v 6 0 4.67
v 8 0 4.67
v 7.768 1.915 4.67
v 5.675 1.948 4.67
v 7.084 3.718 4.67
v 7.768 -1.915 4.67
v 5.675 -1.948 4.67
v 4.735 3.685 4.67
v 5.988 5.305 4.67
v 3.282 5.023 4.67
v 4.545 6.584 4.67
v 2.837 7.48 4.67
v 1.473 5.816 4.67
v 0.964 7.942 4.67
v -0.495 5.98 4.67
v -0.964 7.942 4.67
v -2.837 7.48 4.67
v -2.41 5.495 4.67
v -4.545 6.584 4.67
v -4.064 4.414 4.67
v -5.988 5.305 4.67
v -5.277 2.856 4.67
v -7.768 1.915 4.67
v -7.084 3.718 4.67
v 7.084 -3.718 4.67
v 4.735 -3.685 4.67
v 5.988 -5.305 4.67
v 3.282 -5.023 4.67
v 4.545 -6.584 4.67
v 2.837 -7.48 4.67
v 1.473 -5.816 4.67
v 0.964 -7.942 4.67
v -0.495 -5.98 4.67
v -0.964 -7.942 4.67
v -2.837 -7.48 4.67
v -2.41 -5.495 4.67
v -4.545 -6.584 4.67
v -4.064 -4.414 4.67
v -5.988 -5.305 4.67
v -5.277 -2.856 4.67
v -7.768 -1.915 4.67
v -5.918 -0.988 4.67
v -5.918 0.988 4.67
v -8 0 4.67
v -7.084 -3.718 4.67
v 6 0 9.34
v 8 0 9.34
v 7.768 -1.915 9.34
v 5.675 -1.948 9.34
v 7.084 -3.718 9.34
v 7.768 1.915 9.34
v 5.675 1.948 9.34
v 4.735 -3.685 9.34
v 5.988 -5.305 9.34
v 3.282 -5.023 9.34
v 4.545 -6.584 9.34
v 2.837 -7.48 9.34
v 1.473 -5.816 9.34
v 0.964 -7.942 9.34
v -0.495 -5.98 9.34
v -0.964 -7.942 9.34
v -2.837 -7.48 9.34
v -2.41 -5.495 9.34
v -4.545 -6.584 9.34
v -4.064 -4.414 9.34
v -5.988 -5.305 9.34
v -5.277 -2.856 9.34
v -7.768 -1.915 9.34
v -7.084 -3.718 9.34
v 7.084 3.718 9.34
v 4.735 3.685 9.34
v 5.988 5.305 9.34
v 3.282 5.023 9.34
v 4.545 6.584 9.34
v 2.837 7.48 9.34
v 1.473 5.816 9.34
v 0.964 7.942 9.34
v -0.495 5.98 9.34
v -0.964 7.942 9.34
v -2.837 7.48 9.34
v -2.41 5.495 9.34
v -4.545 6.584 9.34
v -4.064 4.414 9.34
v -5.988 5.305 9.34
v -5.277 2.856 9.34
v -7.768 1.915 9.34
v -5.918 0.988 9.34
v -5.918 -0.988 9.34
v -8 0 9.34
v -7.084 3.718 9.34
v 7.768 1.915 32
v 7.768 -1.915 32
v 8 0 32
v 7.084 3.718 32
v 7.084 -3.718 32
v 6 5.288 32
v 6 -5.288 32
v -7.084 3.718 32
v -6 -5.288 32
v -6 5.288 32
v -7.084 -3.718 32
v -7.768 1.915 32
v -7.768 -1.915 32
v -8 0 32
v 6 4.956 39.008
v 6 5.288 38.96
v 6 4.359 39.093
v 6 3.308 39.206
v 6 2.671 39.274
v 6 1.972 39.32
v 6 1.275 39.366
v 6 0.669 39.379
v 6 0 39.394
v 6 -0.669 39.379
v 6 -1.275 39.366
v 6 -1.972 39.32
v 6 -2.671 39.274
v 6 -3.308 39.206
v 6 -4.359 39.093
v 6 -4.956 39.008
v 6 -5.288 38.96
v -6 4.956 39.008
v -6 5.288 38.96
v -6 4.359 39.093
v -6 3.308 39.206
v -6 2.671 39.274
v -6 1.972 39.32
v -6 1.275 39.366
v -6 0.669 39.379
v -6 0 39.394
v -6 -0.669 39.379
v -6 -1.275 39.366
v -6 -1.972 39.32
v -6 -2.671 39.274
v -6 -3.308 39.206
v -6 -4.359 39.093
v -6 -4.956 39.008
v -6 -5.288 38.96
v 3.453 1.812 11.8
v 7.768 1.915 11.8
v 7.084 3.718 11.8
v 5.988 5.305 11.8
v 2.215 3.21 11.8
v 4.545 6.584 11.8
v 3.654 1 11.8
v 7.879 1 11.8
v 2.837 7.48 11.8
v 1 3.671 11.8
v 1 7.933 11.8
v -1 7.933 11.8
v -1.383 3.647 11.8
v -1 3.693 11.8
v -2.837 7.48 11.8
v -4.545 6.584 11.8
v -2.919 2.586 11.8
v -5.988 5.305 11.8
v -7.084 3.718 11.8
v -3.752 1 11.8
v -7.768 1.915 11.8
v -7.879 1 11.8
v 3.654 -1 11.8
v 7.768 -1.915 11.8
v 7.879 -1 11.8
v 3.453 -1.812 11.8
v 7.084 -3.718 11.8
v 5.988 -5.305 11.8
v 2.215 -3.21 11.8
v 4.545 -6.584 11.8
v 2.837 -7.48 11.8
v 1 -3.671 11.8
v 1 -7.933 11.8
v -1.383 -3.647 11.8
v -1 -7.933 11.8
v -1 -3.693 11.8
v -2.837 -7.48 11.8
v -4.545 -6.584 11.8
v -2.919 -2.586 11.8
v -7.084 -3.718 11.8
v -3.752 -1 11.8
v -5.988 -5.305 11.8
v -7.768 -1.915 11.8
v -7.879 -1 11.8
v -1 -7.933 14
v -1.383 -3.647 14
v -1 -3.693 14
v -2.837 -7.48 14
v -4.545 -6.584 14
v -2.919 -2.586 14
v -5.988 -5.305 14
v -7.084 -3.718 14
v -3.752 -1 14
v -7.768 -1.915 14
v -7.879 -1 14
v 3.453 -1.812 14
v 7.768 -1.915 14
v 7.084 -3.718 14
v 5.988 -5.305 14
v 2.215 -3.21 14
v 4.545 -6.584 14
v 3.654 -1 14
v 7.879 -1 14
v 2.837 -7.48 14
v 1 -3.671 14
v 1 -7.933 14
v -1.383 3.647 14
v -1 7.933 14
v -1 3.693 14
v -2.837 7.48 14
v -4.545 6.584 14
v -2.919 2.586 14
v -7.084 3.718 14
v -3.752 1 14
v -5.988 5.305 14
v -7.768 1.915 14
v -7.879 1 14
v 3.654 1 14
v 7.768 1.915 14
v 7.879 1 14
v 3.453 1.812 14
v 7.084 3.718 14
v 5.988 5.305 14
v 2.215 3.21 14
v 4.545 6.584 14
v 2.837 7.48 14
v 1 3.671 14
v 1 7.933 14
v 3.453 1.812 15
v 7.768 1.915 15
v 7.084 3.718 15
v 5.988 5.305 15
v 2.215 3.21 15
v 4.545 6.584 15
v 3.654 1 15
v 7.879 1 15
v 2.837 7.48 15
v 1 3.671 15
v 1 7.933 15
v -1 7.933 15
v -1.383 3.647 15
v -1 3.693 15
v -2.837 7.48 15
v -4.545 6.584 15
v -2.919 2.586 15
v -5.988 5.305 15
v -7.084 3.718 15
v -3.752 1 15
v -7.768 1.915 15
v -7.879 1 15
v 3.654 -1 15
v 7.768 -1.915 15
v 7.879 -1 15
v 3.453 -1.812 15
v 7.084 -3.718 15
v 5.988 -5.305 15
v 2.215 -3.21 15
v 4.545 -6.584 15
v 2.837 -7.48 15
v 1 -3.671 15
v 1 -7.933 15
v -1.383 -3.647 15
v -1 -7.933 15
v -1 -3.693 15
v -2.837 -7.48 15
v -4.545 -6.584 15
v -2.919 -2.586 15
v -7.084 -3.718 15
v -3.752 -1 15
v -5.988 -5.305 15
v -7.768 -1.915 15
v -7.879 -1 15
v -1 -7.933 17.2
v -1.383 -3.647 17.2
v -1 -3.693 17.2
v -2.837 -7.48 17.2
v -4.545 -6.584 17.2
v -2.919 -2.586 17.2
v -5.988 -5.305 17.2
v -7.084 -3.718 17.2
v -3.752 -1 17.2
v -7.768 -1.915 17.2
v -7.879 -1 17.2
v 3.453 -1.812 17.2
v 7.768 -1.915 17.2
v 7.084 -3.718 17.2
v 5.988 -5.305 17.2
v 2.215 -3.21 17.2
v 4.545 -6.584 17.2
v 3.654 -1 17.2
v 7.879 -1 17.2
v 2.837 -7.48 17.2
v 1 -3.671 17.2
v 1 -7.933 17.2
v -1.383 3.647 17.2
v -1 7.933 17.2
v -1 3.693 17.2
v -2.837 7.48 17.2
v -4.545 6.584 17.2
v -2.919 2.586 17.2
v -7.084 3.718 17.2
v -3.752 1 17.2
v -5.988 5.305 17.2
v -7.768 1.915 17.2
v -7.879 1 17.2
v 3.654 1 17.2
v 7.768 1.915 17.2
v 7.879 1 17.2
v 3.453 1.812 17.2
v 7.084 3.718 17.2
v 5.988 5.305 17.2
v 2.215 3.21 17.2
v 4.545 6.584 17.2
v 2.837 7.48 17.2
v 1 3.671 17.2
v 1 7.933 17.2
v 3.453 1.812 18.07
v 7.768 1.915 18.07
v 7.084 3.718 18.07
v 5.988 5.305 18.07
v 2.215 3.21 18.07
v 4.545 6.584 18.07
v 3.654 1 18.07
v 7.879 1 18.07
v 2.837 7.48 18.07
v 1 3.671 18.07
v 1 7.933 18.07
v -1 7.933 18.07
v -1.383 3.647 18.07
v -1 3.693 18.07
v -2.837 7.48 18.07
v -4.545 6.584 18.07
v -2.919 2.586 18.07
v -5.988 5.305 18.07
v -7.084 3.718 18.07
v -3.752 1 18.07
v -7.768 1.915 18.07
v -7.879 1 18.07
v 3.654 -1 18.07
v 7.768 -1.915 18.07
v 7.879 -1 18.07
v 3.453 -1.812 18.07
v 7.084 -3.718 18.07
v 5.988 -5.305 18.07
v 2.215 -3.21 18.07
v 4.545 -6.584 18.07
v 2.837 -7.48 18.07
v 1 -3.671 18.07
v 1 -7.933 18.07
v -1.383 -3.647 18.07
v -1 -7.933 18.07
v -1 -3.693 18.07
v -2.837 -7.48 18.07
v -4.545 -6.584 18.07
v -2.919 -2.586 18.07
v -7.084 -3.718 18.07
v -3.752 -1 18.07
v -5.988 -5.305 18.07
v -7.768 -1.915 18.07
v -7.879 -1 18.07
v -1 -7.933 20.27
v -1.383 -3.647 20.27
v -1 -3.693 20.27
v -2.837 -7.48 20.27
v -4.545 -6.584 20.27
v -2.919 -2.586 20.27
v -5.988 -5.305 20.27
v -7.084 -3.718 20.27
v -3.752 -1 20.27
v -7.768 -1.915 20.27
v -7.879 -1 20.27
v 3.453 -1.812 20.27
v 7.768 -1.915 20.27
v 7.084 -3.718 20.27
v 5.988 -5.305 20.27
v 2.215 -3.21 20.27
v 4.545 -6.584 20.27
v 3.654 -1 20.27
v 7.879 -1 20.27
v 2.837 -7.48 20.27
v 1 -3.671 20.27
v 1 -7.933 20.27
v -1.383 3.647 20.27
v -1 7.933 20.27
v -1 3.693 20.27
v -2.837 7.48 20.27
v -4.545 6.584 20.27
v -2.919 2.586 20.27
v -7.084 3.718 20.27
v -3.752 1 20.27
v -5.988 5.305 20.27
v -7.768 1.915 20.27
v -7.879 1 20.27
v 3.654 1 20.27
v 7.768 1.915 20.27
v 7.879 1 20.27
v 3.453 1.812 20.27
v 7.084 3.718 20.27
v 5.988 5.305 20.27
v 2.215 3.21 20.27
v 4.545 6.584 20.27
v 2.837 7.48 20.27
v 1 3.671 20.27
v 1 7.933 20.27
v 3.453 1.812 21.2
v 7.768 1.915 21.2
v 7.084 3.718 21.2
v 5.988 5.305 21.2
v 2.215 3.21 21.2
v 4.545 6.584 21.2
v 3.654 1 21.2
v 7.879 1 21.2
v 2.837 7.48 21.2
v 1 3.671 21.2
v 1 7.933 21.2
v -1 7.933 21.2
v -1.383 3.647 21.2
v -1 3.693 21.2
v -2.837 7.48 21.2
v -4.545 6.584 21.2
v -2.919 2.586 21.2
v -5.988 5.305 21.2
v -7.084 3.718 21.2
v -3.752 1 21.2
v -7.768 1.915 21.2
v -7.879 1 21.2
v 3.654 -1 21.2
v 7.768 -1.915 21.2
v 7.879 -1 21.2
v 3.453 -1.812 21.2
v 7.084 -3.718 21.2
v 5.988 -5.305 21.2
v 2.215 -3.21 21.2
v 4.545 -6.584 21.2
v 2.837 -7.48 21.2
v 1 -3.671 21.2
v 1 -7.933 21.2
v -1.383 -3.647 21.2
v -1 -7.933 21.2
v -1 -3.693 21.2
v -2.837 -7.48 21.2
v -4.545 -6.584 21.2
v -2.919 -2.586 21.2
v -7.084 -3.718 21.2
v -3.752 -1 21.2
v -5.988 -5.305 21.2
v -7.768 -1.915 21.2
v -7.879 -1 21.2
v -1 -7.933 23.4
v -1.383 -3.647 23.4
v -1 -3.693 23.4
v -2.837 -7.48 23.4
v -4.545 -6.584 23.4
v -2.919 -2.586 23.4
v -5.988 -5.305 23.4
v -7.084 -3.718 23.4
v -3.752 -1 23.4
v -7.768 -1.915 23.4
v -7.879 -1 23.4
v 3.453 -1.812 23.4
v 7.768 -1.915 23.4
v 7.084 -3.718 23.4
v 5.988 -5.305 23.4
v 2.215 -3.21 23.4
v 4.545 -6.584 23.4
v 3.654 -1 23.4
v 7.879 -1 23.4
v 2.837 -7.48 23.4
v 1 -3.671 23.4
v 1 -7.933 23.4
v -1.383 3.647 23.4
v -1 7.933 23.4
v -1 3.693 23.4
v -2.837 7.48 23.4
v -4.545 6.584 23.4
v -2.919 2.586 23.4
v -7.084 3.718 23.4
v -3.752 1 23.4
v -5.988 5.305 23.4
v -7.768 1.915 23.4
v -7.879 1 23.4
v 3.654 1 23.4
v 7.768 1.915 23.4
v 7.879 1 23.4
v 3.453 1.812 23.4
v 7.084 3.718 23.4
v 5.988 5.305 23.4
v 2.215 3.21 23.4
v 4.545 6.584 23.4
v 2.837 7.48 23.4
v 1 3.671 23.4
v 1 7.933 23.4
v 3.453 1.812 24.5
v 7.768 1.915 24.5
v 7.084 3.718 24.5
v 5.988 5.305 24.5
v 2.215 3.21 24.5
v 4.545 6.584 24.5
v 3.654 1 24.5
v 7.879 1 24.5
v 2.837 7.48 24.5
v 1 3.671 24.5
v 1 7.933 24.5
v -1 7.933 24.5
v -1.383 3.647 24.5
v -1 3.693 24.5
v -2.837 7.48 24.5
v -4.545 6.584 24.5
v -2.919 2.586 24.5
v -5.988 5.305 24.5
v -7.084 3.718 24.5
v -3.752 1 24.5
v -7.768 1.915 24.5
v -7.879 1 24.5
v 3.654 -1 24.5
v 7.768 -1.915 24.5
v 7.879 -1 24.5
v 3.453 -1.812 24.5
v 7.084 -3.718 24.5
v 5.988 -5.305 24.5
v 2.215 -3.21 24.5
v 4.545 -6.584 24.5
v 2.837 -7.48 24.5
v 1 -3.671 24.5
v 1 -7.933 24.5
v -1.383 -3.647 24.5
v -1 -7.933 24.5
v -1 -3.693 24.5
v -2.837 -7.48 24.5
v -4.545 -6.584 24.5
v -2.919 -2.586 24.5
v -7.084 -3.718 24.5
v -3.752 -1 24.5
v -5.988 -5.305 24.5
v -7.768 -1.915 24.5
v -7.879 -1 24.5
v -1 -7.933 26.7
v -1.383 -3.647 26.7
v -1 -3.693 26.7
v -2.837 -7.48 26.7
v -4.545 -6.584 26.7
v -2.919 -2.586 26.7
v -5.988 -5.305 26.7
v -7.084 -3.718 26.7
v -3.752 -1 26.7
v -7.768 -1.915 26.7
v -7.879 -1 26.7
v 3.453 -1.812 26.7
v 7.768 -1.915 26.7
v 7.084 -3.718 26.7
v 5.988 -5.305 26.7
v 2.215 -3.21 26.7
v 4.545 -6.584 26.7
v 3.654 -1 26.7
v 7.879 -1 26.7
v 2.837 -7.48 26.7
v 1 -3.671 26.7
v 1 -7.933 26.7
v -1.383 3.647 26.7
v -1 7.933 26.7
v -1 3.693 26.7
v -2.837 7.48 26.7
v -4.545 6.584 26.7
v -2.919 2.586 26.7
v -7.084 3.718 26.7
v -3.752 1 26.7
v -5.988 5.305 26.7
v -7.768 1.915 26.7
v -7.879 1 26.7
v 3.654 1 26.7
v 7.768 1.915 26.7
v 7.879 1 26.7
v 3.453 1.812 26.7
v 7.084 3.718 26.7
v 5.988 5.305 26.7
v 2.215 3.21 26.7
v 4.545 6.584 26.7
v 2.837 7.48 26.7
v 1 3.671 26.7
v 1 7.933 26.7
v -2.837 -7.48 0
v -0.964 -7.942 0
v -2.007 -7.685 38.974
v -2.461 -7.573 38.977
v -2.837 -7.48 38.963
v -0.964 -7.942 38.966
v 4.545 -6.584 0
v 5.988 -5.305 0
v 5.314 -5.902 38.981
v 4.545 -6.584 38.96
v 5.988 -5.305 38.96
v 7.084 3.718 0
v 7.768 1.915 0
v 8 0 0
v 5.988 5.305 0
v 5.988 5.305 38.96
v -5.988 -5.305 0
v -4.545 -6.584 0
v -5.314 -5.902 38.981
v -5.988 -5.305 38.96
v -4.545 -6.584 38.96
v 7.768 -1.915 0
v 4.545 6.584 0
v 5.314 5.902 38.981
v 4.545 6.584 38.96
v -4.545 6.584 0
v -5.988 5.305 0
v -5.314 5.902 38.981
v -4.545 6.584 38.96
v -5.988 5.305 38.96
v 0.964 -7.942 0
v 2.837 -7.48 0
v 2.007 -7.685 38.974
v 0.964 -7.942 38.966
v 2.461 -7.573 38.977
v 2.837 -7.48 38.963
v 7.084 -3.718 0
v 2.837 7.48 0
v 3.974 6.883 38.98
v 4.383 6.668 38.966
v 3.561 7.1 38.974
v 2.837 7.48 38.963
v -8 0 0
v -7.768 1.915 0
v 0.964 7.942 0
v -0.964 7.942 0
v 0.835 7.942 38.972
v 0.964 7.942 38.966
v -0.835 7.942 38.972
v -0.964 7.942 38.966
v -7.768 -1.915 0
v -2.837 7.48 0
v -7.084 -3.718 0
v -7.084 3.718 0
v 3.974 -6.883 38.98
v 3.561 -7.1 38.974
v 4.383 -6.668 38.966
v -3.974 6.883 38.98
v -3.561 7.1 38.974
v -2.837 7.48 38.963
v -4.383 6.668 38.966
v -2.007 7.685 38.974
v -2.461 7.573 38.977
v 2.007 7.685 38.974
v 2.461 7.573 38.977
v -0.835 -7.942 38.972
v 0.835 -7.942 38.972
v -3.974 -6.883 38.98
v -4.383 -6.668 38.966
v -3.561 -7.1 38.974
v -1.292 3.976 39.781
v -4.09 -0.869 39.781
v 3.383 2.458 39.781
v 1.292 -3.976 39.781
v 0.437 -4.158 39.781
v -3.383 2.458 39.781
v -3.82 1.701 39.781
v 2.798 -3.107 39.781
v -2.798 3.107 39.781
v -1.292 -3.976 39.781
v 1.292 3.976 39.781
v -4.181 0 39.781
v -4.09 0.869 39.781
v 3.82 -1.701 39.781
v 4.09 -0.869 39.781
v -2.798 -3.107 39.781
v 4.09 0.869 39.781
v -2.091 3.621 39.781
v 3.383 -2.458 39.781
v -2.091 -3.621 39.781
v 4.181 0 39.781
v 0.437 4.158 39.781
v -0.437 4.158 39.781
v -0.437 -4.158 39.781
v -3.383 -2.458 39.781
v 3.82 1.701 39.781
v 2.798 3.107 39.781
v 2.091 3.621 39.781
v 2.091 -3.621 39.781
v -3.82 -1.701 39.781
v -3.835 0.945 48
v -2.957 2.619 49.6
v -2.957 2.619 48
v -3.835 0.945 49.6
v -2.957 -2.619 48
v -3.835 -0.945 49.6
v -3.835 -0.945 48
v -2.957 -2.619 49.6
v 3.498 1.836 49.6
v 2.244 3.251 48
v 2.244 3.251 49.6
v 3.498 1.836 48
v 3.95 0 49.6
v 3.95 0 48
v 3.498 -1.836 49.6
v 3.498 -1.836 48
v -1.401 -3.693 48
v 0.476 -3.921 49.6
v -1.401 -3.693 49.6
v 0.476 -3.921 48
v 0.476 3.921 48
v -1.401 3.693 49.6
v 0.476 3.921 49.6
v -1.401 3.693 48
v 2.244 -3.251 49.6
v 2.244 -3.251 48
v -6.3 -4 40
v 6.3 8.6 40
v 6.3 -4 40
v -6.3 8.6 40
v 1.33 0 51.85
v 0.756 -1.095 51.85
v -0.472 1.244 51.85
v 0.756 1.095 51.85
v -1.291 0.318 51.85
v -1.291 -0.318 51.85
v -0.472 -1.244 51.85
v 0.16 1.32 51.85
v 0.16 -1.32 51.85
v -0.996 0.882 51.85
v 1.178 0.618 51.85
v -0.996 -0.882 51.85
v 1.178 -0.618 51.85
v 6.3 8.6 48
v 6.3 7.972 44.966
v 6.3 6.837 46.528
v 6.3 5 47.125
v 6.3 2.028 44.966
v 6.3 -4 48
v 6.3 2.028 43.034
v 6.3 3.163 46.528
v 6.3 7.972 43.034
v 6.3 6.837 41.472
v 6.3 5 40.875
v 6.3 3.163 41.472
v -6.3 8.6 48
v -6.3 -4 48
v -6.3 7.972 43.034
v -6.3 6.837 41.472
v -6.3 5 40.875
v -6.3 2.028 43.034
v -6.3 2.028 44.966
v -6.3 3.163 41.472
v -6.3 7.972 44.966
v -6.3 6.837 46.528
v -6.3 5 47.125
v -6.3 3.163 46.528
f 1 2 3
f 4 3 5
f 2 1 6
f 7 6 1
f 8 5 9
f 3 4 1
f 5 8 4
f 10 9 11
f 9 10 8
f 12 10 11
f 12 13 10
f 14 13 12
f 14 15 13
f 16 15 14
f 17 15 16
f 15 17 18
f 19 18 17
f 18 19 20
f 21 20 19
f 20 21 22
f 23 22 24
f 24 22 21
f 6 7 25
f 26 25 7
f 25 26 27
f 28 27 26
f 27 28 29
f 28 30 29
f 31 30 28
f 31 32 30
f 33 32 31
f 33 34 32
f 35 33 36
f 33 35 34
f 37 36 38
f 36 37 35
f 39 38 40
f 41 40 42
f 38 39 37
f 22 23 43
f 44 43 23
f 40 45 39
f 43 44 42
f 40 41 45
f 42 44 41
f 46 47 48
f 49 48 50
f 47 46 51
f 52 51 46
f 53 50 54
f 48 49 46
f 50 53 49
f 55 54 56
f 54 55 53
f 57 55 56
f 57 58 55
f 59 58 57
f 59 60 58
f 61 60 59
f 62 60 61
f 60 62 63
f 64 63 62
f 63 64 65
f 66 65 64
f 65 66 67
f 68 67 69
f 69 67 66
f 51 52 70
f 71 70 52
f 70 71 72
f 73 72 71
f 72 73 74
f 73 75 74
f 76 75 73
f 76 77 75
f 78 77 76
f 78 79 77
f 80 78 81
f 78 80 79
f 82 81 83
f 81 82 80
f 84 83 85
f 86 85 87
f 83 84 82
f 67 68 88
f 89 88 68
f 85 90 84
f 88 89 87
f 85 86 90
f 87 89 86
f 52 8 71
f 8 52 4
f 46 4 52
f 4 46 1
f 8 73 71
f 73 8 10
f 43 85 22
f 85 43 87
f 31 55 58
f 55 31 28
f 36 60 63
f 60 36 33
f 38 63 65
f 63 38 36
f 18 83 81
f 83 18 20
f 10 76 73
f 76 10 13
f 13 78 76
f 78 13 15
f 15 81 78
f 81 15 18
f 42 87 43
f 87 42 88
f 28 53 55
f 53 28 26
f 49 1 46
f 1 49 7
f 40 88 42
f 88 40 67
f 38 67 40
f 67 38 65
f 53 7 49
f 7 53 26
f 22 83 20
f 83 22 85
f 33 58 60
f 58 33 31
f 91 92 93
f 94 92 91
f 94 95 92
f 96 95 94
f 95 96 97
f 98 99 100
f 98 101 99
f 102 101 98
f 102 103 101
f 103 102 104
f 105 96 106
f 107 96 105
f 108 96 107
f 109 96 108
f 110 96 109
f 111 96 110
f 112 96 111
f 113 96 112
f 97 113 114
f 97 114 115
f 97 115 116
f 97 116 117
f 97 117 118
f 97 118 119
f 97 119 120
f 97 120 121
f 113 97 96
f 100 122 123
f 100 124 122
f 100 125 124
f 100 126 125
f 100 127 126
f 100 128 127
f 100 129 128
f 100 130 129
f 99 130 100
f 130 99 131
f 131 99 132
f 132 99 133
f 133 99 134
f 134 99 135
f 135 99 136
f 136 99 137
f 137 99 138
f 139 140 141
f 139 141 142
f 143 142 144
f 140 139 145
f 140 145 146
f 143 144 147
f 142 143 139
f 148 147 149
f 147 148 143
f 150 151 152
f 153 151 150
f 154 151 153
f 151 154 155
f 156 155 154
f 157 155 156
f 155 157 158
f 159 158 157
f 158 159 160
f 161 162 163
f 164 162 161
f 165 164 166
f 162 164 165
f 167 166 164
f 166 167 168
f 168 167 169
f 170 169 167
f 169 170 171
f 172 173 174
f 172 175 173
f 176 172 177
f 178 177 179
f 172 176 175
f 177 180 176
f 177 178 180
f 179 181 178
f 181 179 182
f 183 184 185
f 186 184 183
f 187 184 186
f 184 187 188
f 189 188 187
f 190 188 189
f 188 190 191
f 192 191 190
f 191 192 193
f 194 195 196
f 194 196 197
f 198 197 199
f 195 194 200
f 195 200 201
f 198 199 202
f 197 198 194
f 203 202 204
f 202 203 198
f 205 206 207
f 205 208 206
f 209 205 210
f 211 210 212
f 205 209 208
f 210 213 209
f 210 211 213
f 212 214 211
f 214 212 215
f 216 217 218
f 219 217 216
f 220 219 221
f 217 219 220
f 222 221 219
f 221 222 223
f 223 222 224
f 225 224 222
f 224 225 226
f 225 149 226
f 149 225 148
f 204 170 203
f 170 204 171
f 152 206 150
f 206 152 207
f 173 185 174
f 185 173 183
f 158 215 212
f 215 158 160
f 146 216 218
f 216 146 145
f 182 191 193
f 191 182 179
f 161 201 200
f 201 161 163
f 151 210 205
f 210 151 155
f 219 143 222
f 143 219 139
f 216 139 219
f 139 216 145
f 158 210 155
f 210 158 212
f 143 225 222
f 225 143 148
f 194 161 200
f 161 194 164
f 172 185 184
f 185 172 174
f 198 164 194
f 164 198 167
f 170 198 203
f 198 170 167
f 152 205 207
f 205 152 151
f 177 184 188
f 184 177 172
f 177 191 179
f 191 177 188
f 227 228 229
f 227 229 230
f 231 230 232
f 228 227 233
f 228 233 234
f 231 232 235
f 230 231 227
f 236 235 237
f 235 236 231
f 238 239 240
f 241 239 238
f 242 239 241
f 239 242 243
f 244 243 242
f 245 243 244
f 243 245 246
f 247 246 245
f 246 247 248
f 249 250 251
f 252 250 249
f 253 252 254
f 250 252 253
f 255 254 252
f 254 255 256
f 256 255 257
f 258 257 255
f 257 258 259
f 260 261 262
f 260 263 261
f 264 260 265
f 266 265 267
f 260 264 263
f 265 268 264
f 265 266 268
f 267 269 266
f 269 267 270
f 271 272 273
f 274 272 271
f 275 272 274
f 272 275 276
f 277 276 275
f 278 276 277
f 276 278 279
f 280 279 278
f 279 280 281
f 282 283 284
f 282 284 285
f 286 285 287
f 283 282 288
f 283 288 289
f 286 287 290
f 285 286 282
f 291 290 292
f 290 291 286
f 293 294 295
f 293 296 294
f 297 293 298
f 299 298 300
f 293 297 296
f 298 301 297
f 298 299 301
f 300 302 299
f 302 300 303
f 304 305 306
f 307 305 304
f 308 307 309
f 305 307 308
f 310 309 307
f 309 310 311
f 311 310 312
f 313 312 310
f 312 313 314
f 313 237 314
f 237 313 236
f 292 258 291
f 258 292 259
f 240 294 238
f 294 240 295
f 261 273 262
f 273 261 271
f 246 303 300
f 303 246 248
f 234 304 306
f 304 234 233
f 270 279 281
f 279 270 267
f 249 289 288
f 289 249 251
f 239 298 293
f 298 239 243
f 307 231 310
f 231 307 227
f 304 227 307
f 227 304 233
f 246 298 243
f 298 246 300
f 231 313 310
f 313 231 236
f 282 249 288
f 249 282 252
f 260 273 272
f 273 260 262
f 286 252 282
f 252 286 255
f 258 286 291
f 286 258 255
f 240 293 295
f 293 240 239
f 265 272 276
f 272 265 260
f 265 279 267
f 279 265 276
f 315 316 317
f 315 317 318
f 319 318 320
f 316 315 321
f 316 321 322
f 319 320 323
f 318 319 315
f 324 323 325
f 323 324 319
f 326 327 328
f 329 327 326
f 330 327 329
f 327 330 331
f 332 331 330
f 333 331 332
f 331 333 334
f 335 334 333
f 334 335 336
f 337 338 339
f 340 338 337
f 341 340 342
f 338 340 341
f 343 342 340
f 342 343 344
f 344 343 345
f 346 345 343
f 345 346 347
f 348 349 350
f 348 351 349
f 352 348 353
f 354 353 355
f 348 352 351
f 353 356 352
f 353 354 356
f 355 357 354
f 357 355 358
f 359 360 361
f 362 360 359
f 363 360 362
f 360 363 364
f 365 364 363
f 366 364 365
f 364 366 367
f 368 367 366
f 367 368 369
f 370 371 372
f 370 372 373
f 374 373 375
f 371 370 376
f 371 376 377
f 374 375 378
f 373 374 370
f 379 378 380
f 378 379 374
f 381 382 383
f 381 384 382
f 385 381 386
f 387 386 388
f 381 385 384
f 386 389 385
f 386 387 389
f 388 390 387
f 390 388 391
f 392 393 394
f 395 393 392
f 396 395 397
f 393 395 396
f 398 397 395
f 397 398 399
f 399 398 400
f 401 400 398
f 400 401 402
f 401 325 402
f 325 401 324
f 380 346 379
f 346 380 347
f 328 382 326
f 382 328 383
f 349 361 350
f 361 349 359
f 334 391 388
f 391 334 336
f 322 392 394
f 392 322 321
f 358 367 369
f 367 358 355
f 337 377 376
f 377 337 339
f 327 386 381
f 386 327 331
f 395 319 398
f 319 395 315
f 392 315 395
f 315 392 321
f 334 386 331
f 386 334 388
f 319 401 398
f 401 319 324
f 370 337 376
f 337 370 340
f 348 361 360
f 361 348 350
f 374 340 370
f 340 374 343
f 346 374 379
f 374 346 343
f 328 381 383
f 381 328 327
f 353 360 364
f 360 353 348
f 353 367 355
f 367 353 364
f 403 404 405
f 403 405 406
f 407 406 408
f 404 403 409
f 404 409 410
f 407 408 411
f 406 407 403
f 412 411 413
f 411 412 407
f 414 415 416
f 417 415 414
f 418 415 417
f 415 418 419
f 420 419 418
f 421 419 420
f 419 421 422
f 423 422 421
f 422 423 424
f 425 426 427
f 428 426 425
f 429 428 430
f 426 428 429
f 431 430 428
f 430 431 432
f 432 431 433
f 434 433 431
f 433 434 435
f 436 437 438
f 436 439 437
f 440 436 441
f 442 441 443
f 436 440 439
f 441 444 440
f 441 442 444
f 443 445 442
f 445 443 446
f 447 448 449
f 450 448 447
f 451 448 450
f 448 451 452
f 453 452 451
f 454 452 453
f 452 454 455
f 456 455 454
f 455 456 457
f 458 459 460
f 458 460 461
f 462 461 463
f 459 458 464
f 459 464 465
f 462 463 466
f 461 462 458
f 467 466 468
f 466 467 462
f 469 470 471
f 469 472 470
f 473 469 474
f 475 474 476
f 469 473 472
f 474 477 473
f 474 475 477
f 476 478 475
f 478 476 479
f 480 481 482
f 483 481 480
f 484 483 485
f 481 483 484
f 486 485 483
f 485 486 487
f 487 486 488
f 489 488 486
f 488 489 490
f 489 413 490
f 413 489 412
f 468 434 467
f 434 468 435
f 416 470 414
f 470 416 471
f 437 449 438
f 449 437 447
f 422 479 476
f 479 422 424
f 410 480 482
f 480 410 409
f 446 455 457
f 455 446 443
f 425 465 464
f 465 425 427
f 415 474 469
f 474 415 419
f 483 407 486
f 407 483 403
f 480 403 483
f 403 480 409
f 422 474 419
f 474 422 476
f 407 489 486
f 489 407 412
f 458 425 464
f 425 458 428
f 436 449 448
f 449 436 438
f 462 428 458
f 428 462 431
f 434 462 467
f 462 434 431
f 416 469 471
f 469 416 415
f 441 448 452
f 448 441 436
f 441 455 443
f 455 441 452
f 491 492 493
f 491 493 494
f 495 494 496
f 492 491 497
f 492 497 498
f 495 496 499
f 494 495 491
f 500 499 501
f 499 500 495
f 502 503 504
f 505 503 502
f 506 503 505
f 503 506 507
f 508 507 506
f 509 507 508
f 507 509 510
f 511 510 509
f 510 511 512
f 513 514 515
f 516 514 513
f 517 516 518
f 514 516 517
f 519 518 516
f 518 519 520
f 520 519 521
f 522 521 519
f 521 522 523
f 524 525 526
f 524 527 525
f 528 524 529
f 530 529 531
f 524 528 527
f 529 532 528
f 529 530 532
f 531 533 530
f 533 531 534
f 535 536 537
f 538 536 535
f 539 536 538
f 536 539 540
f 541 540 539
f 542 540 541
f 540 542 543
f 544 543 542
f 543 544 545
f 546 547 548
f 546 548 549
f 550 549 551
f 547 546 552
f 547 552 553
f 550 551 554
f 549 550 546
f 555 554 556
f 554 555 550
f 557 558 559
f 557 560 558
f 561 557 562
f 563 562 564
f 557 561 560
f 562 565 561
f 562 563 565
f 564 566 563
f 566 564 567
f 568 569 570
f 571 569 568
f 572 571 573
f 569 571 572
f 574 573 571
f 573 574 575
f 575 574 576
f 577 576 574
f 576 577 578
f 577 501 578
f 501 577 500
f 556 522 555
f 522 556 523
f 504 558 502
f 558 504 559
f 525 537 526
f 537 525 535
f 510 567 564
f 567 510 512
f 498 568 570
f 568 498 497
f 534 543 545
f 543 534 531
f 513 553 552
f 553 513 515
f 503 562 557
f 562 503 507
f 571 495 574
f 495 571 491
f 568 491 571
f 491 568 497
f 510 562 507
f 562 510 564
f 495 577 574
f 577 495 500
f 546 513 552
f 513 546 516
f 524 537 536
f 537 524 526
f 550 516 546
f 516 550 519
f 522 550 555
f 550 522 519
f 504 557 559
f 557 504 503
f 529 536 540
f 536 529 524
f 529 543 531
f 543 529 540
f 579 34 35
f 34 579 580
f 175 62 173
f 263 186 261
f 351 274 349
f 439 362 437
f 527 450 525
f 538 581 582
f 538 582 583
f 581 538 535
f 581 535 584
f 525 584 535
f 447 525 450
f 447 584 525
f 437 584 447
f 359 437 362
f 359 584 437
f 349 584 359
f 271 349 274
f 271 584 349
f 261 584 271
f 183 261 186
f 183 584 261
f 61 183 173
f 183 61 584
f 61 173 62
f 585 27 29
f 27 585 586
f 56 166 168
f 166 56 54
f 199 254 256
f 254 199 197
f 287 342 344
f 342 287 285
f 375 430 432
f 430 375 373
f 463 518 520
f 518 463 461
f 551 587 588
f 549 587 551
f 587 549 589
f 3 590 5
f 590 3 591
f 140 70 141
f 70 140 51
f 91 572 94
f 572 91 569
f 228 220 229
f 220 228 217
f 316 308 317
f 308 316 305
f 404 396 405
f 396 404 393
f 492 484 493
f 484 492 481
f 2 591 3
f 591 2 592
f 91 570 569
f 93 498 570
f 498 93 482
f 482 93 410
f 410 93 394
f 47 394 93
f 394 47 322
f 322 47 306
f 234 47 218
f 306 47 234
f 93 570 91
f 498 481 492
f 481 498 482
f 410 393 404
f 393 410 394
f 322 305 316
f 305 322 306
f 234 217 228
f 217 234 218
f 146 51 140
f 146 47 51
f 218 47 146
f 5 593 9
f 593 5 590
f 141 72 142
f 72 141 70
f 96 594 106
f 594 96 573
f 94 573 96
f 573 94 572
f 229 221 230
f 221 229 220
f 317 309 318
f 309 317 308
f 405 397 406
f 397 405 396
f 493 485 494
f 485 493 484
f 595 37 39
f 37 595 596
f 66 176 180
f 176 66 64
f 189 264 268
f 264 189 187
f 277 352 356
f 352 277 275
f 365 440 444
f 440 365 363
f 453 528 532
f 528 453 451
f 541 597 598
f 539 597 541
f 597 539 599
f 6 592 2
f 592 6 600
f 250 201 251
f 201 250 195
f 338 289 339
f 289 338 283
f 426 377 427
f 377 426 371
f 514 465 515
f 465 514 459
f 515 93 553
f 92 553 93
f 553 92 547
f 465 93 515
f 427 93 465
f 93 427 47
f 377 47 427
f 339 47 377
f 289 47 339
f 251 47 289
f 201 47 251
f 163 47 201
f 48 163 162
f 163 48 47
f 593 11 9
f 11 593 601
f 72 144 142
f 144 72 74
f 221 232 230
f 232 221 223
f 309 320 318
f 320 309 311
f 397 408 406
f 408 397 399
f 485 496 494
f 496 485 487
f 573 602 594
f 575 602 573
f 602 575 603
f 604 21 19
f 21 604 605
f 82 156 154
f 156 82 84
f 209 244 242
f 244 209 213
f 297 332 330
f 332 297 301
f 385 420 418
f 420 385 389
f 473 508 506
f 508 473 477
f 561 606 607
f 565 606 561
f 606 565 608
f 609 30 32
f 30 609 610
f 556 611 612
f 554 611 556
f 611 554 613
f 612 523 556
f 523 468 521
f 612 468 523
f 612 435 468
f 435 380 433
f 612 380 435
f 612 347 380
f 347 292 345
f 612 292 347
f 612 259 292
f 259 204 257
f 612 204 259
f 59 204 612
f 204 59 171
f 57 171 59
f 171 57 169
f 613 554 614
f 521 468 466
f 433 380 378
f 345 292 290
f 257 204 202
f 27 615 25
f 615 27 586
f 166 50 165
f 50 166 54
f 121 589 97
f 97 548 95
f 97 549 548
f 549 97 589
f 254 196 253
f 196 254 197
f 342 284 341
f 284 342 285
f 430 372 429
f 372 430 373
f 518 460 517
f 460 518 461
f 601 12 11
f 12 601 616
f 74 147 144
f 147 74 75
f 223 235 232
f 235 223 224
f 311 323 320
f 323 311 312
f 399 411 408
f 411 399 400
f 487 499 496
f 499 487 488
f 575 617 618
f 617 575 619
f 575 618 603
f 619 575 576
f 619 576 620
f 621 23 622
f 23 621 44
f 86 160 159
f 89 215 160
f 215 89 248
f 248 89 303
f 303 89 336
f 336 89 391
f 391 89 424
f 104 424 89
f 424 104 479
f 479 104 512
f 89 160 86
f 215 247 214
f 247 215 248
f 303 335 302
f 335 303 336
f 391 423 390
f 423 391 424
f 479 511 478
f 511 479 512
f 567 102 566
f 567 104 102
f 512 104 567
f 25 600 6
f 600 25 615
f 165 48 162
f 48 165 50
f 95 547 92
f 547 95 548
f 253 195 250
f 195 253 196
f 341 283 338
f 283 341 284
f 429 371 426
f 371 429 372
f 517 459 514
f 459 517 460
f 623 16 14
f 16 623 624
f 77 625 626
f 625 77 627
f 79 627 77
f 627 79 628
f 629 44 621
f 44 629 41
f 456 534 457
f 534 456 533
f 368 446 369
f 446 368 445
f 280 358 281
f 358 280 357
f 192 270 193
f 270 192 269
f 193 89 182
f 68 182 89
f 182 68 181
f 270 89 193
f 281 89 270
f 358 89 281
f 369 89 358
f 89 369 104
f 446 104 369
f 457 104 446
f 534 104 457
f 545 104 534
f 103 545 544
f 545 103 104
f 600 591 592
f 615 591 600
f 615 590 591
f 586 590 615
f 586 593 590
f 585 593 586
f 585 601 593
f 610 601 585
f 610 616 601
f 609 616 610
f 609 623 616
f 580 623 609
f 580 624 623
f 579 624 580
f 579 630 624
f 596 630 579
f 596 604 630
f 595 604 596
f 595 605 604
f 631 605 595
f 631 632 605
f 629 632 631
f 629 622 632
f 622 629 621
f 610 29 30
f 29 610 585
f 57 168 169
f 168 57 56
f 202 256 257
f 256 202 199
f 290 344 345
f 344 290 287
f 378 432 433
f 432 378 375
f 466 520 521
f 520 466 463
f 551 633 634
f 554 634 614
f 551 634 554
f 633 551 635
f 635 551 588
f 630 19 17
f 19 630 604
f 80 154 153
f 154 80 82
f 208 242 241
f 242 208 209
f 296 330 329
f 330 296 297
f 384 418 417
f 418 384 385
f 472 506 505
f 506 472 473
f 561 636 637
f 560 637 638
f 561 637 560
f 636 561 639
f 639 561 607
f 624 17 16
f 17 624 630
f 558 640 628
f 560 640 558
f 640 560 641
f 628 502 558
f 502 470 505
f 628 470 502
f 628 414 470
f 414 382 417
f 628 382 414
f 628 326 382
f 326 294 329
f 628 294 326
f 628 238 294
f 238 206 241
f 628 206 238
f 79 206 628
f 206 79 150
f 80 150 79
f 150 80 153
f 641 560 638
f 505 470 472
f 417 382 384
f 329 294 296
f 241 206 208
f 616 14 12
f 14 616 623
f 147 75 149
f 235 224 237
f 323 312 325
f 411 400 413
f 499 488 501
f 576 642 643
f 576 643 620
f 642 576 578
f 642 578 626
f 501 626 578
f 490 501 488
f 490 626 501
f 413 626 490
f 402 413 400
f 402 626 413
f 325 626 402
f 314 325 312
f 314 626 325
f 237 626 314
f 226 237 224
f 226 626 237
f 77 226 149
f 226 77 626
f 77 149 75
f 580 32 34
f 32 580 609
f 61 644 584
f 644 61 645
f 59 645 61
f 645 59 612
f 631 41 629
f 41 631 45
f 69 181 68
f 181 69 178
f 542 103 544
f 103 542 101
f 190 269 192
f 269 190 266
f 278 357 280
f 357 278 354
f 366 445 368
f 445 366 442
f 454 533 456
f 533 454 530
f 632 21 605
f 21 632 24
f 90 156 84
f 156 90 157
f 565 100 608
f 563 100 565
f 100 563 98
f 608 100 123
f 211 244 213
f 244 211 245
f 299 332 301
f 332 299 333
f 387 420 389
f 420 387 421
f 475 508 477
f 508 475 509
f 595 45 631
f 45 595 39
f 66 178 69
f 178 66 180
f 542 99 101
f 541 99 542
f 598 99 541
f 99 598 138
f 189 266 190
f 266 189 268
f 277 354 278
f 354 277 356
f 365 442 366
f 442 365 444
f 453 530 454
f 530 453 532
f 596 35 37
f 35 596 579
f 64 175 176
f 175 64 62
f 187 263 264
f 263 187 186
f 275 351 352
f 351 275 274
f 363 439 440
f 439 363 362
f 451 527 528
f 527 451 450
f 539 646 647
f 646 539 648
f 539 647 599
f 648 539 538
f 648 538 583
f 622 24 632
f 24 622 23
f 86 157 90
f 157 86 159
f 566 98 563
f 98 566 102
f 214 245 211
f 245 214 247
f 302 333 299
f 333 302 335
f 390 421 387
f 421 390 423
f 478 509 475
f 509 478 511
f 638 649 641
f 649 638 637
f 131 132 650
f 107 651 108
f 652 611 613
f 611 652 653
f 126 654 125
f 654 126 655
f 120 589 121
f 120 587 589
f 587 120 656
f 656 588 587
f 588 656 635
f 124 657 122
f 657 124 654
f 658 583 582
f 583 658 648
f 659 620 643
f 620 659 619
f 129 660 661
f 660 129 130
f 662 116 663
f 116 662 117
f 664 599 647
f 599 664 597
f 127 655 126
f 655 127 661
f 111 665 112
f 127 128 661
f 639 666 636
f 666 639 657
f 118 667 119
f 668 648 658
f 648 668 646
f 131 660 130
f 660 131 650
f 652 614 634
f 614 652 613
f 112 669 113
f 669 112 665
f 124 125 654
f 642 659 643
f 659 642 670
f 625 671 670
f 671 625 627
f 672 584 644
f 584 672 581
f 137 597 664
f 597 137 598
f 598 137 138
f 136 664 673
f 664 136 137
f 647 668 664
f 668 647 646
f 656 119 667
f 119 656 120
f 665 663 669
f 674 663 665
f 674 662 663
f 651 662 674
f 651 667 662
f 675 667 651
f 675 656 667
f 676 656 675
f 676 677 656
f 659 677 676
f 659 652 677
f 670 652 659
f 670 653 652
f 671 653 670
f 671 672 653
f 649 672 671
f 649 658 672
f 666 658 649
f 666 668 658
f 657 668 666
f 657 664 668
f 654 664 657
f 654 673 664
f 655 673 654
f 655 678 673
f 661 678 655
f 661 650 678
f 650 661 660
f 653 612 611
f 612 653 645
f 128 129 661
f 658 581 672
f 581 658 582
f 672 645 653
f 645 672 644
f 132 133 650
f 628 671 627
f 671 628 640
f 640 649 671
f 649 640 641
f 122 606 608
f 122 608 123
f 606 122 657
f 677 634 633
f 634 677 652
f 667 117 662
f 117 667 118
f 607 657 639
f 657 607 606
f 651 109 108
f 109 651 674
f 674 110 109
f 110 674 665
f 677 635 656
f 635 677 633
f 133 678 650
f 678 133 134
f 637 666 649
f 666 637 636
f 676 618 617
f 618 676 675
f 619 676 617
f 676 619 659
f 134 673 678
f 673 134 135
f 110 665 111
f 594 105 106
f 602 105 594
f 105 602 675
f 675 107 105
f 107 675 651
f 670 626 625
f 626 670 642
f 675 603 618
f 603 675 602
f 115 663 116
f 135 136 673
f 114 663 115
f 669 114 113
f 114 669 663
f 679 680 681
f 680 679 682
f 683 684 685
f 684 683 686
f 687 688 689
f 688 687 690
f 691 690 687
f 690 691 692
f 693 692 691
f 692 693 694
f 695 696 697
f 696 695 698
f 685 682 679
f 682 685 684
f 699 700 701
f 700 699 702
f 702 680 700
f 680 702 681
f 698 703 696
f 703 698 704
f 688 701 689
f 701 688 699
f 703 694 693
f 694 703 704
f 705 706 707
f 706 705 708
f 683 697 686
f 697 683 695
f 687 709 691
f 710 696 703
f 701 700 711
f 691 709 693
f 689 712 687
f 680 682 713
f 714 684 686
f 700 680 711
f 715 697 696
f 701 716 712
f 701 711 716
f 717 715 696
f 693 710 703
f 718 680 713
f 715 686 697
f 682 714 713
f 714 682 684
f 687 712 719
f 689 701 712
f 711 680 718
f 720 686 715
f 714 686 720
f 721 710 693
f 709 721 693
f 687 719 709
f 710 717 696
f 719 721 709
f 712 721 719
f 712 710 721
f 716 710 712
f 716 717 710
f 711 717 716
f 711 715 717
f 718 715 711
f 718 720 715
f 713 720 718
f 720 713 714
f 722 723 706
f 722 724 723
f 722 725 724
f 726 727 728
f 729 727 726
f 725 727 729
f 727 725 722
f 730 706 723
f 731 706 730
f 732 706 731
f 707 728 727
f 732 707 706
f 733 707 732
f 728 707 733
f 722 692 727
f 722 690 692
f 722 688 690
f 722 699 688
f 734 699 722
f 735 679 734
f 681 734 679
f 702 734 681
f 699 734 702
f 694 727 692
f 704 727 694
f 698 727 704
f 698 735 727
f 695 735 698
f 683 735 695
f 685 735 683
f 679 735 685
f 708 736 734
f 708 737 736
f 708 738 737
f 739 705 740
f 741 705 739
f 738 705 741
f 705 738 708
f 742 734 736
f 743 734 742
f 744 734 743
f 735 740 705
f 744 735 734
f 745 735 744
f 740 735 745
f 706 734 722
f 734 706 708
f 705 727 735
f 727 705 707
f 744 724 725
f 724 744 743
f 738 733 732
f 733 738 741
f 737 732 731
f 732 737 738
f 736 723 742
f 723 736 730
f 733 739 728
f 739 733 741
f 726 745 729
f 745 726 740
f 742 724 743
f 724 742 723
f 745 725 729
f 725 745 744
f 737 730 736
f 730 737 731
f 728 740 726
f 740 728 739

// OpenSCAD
hotend_jhead();

module hotend_jhead() {
	translate([0,0,0])  jhead_plastic_body();
	translate([0,0,40]) jhead_brass_nozzle();
}

module jhead_plastic_body() {
	intersection() {
	difference() {
		cylinder(h=40,r=8);
		translate([0,0,4.67]) jhead_groovemount_cutout();
	
		// add the wrench flats
		translate([0,0,32]) jhead_wrench_cutout();
		
		// add (crappy) cooling grooves
		translate([0,0,11.80]) jhead_cooling_cutout();
		translate([0,0,15.00]) jhead_cooling_cutout();
		translate([0,0,18.07]) jhead_cooling_cutout();
		translate([0,0,21.20]) jhead_cooling_cutout();
		translate([0,0,24.50]) jhead_cooling_cutout();
	}
	// get the rounded bit at the end
	sphere(r=40);
	}
}

module jhead_groovemount_cutout() {
	difference() {
		cylinder(h=4.67,r=10);
		cylinder(h=4.67,r=6);
	}
}

module jhead_wrench_cutout() {
	difference() {
		translate([-10,-10,0]) cube([20,20,8]);
		translate([-6,-10,0])  cube([12,20,8]);
	}
}

module jhead_cooling_cutout() {
	render() difference() {
		difference() {
			cylinder(h=2.20,r=10);		
			translate([-1,-10,0]) cube([2,20,2.2]);
			translate([-10,-1,0]) cube([20,2,2.2]);
		}
		cylinder(h=2.20,r=3.9);
	}
}

module jhead_brass_nozzle() { 
	// heater body 12.65 x 12.65 x 8
	//
	//
	difference() {
	union() {
	// draw the cylinder and cap it with the nozzle
	translate([0,0,0])     cylinder(h=9.60, r=3.95);
	translate([0,0,9.6])   cylinder(h=2.25, r1=3.95, r2=1.33);
	translate([-6.3,-4,0]) cube([12.6,12.6,8]);
	}
	translate([6.4,5,4]) rotate([0,270,0]) cylinder(h=12.8,r=3.125);
	}
}
